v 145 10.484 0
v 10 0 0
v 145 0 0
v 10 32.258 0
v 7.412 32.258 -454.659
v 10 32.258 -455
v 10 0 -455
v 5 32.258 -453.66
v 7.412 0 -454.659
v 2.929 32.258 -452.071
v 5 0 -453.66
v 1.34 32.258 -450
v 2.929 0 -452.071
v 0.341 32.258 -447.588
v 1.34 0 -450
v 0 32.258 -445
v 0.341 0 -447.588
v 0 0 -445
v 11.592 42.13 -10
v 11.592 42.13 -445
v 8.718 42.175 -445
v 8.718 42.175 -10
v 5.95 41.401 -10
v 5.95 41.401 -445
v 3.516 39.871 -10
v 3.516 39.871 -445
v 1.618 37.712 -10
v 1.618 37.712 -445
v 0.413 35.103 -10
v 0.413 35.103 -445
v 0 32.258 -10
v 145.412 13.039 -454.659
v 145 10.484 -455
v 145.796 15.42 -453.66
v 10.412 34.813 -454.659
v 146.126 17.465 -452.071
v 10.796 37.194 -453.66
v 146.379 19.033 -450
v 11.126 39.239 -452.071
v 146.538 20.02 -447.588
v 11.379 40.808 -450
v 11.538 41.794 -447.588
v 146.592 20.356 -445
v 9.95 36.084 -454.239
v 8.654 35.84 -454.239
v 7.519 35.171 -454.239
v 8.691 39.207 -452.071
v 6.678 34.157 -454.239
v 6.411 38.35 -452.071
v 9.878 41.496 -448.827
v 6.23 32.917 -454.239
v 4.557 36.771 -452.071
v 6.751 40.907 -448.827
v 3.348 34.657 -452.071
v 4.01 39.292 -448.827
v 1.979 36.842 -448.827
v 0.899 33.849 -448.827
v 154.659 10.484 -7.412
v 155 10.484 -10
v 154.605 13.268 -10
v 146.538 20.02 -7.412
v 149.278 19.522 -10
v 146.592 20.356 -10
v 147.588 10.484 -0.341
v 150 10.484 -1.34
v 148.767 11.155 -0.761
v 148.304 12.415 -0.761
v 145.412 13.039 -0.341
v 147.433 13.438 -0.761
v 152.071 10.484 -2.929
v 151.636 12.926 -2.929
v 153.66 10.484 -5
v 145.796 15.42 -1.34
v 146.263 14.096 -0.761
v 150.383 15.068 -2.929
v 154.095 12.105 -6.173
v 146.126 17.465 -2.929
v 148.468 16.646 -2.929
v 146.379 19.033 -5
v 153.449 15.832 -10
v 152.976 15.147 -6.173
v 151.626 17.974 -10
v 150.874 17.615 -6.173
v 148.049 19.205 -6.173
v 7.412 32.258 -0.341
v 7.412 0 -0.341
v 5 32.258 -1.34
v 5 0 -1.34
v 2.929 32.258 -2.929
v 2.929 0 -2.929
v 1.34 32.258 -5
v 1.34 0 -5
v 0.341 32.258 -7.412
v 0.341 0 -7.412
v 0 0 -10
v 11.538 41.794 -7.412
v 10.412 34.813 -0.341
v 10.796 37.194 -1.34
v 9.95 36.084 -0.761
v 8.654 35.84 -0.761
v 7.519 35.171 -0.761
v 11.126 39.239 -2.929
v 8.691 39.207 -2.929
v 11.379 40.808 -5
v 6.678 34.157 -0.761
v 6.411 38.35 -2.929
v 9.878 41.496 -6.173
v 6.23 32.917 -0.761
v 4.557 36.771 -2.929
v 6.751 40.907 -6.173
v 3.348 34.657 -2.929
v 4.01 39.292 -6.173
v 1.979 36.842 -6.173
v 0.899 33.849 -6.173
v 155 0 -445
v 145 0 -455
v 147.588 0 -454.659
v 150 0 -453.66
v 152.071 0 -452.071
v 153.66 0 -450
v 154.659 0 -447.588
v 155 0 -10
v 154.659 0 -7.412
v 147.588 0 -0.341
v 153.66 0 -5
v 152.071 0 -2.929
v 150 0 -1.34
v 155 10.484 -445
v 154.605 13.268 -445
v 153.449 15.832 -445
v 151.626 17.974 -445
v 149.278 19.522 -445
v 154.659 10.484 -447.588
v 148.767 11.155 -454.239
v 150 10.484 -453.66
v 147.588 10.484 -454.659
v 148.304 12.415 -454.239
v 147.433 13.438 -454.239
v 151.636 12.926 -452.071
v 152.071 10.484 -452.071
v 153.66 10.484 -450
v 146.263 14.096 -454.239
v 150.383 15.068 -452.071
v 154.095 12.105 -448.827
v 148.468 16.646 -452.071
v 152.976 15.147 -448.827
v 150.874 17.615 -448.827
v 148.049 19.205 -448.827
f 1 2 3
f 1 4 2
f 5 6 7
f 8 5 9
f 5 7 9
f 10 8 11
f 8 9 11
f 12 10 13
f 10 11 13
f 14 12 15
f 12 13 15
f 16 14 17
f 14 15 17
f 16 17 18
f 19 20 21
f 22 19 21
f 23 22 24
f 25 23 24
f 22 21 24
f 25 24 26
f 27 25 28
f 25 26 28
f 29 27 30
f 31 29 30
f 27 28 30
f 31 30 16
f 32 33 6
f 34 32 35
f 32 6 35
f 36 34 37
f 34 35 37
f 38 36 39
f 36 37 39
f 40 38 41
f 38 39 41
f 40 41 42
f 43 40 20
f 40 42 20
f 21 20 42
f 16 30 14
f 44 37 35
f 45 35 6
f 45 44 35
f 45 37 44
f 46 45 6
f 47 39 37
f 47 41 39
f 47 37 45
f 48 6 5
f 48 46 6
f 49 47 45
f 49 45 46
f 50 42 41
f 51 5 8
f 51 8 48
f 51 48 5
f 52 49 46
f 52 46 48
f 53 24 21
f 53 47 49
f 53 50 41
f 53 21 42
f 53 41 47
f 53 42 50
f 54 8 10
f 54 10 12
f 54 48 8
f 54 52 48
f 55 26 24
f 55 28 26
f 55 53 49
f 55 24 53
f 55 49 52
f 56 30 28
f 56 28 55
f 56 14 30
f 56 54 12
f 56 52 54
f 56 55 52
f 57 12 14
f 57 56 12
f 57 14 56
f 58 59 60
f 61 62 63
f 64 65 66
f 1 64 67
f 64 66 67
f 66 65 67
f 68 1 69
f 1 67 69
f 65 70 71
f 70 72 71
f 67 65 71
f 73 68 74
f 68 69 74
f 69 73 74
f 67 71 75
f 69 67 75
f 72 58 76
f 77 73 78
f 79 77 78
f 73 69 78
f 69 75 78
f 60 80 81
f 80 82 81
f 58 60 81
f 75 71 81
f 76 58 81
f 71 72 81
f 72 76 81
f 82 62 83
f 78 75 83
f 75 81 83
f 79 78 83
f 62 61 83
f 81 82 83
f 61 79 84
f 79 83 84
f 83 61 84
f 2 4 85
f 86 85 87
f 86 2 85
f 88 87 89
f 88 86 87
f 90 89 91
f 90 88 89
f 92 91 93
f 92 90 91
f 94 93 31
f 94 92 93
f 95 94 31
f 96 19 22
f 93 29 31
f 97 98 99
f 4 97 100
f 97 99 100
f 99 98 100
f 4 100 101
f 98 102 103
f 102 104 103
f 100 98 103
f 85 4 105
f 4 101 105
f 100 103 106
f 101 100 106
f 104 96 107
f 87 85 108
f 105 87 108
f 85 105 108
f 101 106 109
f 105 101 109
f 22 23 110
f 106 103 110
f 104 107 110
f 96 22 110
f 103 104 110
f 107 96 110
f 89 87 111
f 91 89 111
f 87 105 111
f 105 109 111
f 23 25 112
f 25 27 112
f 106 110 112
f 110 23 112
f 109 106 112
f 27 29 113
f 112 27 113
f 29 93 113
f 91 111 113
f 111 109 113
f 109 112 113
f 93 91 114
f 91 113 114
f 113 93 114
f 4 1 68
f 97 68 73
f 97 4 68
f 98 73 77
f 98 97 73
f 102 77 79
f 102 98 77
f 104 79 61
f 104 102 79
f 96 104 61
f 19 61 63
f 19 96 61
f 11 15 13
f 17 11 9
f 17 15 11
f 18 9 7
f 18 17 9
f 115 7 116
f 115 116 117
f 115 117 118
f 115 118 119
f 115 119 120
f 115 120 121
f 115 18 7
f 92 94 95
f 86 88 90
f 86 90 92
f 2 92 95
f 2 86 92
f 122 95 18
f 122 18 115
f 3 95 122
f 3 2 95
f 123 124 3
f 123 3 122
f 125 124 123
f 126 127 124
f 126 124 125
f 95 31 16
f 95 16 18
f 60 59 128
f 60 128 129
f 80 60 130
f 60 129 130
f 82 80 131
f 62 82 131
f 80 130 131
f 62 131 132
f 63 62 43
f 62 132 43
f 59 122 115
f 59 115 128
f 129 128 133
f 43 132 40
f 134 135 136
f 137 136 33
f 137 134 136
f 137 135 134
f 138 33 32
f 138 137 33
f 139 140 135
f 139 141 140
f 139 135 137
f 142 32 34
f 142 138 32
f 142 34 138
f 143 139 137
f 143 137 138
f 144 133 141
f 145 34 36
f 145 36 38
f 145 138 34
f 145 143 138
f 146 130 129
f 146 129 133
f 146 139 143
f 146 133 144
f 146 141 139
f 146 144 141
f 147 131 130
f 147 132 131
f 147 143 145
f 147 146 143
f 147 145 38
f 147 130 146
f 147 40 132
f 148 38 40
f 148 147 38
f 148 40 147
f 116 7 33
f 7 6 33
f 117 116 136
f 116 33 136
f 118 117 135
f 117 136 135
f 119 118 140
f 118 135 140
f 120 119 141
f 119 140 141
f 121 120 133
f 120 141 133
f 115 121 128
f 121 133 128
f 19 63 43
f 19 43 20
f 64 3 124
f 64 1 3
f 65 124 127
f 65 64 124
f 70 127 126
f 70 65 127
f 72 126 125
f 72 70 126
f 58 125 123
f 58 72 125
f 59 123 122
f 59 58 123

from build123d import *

# Parameters (mm, degrees)
BOSS_EXTRUDE1_DEPTH = 455
FILLET1_R           = 10
FILLET2_R           = 10
FILLET3_R           = 10
FILLET4_R           = 10


with BuildPart() as part:
    # Sketch1 → Boss-Extrude1 (new body)
    with BuildSketch(Plane.XY):
        Polygon((0, 0), (155, 0), (155, 19), (0, 44), align=None)
    extrude(amount=-BOSS_EXTRUDE1_DEPTH)

    # Fillet1
    fillet1_edges = [part.edges().sort_by_distance(p)[0] for p in [
        (155, 19, -227.5),
    ]]
    fillet(fillet1_edges, radius=FILLET1_R)

    # Fillet2
    fillet2_edges = [part.edges().sort_by_distance(p)[0] for p in [
        (0, 44, -227.5),
    ]]
    fillet(fillet2_edges, radius=FILLET2_R)

    # Fillet3
    fillet3_edges = [part.edges().sort_by_distance(p)[0] for p in [
        (79.092324388, 31.243173486, 0),
        (152.613253046, 16.967366458, 0),
        (0, 16.128929526, 0),
        (3.516299046, 39.871112099, 0),
        (155, 5.241832752, 0),
    ]]
    fillet(fillet3_edges, radius=FILLET3_R)

    # Fillet4
    fillet4_edges = [part.edges().sort_by_distance(p)[0] for p in [
        (155, 5.241832752, -455),
        (79.092324388, 31.243173486, -455),
        (152.613253046, 16.967366458, -455),
        (0, 16.128929526, -455),
        (3.516299046, 39.871112099, -455),
    ]]
    fillet(fillet4_edges, radius=FILLET4_R)


solid = part.part
